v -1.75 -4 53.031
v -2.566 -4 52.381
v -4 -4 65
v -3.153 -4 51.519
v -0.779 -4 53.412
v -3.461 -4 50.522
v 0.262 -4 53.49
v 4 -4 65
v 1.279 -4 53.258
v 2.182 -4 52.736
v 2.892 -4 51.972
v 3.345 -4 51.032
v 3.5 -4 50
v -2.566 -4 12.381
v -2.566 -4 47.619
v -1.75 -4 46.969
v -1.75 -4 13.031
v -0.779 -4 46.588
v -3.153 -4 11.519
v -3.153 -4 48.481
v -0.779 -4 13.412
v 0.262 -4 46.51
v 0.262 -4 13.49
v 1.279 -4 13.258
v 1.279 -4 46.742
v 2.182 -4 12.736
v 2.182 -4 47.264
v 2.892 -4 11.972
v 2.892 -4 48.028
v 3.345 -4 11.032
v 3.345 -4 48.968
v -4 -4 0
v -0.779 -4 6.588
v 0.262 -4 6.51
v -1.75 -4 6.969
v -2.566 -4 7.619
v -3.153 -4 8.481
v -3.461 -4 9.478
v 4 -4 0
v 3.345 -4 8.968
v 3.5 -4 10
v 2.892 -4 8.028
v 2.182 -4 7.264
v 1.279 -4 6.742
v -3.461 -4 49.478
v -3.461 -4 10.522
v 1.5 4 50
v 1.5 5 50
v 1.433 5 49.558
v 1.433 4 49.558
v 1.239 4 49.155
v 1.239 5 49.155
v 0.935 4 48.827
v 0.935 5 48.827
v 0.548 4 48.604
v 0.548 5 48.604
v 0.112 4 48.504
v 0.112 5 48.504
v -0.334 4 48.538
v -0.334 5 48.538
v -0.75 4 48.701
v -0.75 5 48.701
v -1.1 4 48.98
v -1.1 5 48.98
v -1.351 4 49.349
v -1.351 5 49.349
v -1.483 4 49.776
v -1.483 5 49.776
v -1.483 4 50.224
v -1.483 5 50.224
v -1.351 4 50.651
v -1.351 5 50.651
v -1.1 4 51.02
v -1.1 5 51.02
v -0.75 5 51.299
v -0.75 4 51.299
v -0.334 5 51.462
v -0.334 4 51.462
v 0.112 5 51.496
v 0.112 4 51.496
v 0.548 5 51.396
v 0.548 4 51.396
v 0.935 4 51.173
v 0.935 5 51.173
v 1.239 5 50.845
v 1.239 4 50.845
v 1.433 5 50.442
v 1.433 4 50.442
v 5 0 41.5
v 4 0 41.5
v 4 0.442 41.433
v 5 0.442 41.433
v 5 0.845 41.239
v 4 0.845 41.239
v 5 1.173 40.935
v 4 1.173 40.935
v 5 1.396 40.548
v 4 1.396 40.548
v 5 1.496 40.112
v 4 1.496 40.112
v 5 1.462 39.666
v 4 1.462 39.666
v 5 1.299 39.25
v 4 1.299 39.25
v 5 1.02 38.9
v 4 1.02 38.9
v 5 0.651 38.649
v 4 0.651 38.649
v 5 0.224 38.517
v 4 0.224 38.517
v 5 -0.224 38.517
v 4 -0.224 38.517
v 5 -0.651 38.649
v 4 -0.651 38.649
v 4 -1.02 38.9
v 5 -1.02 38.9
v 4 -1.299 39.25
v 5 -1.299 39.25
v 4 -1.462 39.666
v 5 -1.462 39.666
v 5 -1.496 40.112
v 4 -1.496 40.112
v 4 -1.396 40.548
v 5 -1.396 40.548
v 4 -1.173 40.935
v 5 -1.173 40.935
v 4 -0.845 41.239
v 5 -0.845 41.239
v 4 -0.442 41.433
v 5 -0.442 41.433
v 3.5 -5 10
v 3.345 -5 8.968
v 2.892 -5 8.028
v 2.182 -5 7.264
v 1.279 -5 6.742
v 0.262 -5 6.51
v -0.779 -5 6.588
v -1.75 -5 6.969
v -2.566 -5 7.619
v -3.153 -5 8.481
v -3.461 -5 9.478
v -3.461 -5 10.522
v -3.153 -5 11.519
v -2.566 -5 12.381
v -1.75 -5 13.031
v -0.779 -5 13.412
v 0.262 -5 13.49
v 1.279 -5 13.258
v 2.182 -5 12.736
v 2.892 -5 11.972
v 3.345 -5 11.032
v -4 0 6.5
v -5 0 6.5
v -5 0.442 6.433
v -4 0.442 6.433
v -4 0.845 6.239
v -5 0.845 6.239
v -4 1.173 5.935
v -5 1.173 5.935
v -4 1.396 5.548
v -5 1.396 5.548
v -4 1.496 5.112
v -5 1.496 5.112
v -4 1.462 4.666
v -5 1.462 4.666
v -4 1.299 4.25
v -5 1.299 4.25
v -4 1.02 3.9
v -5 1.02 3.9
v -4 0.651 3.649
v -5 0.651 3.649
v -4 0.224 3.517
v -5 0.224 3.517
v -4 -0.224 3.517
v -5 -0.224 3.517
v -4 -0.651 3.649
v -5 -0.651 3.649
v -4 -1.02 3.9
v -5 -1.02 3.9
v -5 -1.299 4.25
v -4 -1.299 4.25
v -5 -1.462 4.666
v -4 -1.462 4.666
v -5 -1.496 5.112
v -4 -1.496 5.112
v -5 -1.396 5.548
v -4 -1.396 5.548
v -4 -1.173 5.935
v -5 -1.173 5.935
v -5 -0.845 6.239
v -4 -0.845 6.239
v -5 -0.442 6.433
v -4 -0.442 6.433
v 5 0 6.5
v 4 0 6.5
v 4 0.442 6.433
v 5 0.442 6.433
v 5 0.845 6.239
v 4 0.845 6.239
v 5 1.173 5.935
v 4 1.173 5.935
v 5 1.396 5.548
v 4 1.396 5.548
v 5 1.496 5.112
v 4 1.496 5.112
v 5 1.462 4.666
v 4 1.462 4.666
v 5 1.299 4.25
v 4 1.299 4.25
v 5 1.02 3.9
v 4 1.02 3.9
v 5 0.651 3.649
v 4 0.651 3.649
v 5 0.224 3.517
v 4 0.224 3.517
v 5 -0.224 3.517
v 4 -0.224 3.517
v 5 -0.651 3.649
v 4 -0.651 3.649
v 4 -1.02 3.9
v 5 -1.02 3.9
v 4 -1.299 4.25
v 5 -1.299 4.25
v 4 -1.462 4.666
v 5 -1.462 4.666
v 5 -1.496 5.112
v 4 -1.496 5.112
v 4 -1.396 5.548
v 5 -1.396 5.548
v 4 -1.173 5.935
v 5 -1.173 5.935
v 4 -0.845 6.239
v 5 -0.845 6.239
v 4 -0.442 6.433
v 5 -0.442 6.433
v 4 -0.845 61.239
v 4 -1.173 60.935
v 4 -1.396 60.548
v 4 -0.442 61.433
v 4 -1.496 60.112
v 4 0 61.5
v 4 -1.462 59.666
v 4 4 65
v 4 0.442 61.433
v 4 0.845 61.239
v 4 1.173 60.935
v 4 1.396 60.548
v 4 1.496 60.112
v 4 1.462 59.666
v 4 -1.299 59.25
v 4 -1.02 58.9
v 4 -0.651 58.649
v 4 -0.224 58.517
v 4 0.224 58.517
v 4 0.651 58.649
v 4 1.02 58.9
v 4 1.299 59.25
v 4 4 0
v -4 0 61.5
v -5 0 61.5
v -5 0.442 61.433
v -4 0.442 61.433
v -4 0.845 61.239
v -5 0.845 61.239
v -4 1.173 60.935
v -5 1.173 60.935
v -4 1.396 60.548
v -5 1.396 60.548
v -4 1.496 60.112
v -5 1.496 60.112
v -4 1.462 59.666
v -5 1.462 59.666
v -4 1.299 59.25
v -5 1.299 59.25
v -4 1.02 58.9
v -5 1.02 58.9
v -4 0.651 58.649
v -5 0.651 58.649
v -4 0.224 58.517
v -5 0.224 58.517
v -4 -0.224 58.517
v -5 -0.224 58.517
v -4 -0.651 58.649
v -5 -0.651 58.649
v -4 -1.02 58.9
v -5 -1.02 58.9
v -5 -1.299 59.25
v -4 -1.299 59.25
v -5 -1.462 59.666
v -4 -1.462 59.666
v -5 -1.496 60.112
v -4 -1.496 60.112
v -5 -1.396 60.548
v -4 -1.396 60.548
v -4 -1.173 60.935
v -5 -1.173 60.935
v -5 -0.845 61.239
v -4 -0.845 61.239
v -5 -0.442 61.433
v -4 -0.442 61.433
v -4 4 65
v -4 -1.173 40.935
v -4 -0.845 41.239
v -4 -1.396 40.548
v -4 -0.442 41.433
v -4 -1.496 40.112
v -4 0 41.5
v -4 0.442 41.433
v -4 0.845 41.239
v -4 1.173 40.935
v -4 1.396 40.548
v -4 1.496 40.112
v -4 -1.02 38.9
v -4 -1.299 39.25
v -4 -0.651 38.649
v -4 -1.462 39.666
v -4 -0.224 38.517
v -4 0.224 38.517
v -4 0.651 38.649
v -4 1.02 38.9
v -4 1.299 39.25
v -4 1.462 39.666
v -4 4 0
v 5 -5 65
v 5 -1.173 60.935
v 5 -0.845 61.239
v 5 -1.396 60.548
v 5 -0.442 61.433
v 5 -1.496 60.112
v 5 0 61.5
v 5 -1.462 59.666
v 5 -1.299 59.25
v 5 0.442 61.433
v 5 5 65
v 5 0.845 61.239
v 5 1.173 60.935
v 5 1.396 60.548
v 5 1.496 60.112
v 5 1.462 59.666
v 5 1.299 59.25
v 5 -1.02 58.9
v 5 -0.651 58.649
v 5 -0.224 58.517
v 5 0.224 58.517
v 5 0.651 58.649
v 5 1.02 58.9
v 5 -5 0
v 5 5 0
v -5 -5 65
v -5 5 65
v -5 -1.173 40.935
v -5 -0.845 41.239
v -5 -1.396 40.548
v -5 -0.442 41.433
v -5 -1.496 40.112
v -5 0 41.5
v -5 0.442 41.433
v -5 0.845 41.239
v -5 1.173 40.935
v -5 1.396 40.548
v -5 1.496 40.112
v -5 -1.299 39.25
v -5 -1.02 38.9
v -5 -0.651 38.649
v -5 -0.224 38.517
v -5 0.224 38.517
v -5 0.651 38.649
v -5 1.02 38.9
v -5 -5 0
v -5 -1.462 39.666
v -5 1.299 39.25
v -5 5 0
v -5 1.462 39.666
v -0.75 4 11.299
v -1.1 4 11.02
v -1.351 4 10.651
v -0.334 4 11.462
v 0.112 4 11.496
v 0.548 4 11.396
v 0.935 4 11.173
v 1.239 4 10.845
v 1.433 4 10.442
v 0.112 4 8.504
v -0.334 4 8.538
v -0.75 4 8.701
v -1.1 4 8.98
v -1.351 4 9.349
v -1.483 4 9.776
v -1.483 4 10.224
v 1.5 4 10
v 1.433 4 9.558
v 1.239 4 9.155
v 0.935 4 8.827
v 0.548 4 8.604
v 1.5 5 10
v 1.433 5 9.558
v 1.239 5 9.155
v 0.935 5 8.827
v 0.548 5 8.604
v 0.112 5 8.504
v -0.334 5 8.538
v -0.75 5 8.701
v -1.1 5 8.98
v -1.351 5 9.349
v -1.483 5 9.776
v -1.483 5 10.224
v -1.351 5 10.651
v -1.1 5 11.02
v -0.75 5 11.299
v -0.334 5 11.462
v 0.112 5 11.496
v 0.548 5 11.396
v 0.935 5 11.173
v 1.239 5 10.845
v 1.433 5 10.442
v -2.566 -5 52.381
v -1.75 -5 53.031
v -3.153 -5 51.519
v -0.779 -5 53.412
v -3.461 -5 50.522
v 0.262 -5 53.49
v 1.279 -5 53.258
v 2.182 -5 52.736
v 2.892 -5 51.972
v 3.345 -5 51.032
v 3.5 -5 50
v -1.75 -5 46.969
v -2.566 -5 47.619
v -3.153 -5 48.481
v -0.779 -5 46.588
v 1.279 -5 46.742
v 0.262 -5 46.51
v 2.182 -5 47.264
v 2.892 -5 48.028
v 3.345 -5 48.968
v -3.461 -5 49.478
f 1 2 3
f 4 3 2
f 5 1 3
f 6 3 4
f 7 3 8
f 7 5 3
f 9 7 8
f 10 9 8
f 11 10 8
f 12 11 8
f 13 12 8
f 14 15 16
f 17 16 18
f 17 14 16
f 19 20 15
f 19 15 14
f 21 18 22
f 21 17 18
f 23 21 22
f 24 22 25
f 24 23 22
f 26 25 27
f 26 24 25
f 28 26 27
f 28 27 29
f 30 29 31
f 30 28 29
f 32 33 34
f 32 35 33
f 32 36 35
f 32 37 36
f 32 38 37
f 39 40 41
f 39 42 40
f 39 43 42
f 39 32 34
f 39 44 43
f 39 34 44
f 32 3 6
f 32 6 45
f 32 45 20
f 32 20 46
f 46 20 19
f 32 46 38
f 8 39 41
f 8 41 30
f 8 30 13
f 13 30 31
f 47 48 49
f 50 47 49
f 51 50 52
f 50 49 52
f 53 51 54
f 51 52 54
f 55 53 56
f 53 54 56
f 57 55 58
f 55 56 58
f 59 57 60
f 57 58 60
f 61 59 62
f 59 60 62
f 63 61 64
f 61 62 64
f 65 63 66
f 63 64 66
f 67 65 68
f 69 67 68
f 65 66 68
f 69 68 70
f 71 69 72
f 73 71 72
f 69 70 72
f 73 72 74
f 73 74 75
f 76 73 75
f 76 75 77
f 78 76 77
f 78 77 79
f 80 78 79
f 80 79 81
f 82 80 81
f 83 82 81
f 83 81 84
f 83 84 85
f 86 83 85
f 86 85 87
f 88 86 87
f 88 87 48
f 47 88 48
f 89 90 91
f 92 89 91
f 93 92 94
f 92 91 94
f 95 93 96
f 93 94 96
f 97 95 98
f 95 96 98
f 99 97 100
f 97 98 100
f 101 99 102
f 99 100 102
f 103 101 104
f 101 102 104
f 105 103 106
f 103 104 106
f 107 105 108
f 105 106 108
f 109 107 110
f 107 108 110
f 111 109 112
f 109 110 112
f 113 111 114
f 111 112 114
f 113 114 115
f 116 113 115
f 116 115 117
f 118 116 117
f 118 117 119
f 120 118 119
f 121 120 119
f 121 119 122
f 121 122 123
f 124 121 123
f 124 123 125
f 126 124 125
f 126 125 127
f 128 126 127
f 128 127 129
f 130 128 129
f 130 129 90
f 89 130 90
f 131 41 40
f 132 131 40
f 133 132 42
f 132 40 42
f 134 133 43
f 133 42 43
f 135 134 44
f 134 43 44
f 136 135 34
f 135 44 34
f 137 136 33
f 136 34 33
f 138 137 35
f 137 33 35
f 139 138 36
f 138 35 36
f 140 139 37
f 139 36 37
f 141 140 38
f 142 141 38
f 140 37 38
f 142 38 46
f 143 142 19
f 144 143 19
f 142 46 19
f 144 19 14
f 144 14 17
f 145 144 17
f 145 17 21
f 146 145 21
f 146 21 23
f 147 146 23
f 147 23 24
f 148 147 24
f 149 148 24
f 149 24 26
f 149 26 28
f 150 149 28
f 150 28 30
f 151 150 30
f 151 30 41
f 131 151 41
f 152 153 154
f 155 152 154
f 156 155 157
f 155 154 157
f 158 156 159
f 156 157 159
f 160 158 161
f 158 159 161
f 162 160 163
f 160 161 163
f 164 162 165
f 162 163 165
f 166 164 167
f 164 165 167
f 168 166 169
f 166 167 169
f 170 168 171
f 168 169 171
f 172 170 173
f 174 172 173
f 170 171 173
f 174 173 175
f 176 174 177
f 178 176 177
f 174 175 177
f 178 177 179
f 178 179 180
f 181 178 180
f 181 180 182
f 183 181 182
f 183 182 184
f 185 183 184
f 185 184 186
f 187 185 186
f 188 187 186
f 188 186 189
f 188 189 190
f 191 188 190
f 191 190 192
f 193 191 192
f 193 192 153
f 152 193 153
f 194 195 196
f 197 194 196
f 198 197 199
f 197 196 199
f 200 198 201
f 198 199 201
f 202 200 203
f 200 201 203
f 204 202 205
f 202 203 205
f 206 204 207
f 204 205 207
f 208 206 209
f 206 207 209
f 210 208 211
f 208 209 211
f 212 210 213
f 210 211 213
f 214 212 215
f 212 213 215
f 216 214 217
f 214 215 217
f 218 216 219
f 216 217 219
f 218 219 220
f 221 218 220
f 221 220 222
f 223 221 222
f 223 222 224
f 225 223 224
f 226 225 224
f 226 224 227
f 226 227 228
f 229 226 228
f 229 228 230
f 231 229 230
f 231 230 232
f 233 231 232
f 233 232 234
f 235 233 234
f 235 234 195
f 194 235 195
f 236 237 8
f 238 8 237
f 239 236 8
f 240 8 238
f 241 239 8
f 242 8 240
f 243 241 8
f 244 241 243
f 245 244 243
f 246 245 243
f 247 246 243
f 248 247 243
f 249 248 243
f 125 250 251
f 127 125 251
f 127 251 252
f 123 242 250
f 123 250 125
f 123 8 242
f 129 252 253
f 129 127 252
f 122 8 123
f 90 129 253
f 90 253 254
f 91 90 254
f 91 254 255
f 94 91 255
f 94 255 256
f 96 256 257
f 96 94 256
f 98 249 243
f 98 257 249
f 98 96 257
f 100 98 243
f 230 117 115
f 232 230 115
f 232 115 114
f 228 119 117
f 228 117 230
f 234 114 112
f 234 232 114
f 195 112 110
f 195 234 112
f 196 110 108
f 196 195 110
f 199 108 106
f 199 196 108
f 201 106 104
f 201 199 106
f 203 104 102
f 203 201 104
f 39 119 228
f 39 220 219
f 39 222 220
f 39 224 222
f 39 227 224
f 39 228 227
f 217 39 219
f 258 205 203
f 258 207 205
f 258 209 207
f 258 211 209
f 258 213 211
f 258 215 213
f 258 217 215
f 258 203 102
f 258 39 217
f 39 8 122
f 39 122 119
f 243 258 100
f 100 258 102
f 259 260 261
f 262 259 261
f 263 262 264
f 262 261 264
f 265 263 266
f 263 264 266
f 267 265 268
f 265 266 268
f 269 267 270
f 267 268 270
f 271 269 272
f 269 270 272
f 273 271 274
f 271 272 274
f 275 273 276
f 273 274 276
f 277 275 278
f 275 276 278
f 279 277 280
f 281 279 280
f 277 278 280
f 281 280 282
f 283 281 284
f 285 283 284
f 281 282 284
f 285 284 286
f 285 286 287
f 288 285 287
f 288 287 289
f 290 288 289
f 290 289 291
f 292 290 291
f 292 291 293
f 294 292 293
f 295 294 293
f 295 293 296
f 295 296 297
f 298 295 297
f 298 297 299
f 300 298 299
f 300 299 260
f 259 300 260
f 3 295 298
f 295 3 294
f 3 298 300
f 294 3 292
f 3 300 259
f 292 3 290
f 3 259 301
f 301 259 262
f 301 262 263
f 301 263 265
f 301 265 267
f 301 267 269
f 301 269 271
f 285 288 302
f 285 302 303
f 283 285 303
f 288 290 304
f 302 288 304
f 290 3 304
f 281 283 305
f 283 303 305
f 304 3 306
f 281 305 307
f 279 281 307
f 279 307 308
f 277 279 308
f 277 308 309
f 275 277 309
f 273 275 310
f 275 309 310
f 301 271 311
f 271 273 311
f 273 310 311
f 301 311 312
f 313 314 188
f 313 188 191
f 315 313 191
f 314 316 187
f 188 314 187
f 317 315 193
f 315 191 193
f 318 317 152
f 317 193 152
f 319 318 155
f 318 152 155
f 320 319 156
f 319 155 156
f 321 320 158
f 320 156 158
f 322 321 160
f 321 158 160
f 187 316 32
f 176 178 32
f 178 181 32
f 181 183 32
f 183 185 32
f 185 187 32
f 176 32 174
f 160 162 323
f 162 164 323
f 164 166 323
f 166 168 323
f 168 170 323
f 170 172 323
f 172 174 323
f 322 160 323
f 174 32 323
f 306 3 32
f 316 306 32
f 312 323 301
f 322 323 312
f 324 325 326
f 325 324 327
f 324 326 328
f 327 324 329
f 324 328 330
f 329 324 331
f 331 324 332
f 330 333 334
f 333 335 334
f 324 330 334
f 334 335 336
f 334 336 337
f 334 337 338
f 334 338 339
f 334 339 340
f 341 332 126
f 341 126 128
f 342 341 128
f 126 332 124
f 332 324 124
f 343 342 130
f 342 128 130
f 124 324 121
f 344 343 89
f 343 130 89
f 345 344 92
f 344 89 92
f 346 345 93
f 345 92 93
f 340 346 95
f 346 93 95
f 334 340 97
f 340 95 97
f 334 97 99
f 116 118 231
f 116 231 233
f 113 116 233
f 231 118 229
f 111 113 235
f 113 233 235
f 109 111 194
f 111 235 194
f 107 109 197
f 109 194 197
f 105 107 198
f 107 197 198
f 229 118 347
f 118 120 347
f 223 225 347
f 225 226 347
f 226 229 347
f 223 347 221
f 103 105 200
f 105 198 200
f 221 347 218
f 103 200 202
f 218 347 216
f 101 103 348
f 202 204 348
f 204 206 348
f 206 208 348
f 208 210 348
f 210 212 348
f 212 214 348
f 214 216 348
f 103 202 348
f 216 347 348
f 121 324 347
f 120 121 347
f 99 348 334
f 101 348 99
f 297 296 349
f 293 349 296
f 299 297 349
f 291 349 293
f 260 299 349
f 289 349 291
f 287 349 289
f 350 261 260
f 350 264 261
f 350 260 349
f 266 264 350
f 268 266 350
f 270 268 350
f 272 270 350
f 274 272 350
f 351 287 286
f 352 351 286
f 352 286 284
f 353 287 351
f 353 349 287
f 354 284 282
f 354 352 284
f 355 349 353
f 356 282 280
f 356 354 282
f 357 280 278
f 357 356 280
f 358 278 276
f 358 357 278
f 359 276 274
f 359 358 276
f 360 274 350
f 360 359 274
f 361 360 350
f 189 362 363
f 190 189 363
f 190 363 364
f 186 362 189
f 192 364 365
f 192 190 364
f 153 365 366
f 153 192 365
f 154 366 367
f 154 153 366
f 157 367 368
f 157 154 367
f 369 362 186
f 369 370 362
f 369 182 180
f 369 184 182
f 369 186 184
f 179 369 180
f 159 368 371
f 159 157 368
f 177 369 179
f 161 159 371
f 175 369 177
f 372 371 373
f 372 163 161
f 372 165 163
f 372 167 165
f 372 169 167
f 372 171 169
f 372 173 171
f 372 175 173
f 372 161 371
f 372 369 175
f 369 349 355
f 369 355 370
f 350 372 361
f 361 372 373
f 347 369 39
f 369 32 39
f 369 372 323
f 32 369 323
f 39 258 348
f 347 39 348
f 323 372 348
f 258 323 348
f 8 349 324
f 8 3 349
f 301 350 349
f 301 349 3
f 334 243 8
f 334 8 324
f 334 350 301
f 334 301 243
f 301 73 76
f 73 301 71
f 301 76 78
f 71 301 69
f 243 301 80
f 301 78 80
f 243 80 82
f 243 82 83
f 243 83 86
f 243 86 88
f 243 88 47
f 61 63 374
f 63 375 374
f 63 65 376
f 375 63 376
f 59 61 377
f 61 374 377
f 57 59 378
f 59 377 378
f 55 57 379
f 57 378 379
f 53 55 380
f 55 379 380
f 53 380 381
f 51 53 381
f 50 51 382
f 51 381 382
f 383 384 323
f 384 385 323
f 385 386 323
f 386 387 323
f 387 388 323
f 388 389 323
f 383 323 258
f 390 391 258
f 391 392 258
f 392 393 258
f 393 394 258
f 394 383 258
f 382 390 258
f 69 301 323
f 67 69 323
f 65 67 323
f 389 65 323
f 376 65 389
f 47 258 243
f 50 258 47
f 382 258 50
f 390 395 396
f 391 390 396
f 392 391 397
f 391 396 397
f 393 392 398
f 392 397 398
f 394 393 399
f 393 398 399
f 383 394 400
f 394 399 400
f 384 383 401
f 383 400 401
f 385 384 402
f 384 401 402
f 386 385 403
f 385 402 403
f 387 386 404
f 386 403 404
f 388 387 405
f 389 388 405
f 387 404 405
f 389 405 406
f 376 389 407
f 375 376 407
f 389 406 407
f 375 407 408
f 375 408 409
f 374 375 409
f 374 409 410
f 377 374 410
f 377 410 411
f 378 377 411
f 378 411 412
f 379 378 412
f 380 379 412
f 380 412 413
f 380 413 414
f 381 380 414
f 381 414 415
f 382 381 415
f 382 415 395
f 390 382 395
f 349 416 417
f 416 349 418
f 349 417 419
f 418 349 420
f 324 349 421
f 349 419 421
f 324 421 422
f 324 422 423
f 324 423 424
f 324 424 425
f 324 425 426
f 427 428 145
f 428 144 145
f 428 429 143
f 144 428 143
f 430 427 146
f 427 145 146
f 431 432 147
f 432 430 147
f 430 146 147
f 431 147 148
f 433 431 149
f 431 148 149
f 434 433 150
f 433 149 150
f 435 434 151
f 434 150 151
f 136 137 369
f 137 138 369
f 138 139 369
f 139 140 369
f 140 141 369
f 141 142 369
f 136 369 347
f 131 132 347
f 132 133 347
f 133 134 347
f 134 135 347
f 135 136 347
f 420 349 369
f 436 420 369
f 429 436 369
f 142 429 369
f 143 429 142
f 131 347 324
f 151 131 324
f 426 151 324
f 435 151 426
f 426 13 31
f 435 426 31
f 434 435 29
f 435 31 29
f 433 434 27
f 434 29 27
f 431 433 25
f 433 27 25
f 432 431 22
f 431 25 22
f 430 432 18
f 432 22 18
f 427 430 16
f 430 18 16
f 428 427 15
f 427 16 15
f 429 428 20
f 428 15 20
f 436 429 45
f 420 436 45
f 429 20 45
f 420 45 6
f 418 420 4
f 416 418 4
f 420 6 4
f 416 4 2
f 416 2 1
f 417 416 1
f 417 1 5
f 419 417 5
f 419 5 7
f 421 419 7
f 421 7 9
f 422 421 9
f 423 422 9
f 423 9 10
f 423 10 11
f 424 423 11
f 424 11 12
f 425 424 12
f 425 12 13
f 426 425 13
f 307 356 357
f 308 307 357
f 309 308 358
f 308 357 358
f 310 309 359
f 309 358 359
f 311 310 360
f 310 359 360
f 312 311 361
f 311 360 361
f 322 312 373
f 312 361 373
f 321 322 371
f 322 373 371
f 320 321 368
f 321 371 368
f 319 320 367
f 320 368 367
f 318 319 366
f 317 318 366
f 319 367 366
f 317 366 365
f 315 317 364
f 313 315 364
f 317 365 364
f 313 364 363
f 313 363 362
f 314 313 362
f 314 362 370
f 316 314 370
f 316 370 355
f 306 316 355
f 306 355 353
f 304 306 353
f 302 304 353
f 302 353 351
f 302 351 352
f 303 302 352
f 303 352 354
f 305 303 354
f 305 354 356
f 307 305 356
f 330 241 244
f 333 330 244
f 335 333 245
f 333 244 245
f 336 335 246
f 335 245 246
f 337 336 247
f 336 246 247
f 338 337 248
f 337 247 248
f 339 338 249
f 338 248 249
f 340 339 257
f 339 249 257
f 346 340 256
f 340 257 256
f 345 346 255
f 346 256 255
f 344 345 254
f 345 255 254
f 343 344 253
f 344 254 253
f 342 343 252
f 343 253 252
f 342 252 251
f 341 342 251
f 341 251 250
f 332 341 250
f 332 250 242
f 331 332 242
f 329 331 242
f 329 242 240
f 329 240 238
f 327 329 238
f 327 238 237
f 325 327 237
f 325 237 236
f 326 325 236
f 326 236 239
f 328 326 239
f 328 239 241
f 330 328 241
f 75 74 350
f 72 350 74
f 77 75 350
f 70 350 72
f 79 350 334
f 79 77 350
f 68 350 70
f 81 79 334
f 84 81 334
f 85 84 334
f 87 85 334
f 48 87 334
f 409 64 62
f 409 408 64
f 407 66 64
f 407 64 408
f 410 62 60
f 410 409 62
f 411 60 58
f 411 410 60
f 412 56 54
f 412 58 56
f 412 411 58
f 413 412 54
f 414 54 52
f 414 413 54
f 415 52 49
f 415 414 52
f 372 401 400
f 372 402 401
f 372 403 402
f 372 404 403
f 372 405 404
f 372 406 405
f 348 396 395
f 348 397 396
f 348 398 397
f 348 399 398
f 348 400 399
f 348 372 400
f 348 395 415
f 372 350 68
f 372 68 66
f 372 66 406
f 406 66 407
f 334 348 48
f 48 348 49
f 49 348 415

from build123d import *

# Parameters (mm, degrees)
SKETCH_1_W          = 10
SKETCH_1_H          = 10
SKETCH_1_W_2        = 8
SKETCH_1_H_2        = 8
EXTRUDE_1_DEPTH     = 65
SKETCH_2_R          = 1.5
CUT_EXTRUDE_1_DEPTH = 11
SKETCH_5_R          = 1.5
CUT_EXTRUDE_2_DEPTH = 11
CUT_EXTRUDE_START   = -5
SKETCH_6_R          = 3.5
CUT_EXTRUDE_3_DEPTH = 5


with BuildPart() as part:
    # 草图1 → 拉伸-薄壁1 (new body)
    with BuildSketch(Plane.XY):
        Rectangle(SKETCH_1_W, SKETCH_1_H)
        Rectangle(SKETCH_1_W_2, SKETCH_1_H_2, mode=Mode.SUBTRACT)
    extrude(amount=EXTRUDE_1_DEPTH)

    # 草图2 → 切除-拉伸1 (cut, through all)
    with BuildSketch(Plane.ZY.offset(5)):
        with Locations((40, 0)):
            Circle(SKETCH_2_R)
        with Locations((60, 0)):
            Circle(SKETCH_2_R)
        with Locations((5, 0)):
            Circle(SKETCH_2_R)
    extrude(amount=-CUT_EXTRUDE_1_DEPTH, mode=Mode.SUBTRACT)

    # 草图5 → 切除-拉伸2 (cut, through all)
    with BuildSketch(Plane(origin=(0, 5, 0), x_dir=(1, 0, 0), z_dir=(0, 1, 0))):
        with Locations((0, -10)):
            Circle(SKETCH_5_R)
        with Locations((0, -50)):
            Circle(SKETCH_5_R)
    extrude(amount=-CUT_EXTRUDE_2_DEPTH, mode=Mode.SUBTRACT)

    # 草图6 → 切除-拉伸3 (cut)
    with BuildSketch(Plane(origin=(0, 5, 0), x_dir=(1, 0, 0), z_dir=(0, 1, 0)).offset(CUT_EXTRUDE_START)):
        with Locations((0, -10)):
            Circle(SKETCH_6_R)
        with Locations((0, -50)):
            Circle(SKETCH_6_R)
    extrude(amount=-CUT_EXTRUDE_3_DEPTH, mode=Mode.SUBTRACT)


solid = part.part
